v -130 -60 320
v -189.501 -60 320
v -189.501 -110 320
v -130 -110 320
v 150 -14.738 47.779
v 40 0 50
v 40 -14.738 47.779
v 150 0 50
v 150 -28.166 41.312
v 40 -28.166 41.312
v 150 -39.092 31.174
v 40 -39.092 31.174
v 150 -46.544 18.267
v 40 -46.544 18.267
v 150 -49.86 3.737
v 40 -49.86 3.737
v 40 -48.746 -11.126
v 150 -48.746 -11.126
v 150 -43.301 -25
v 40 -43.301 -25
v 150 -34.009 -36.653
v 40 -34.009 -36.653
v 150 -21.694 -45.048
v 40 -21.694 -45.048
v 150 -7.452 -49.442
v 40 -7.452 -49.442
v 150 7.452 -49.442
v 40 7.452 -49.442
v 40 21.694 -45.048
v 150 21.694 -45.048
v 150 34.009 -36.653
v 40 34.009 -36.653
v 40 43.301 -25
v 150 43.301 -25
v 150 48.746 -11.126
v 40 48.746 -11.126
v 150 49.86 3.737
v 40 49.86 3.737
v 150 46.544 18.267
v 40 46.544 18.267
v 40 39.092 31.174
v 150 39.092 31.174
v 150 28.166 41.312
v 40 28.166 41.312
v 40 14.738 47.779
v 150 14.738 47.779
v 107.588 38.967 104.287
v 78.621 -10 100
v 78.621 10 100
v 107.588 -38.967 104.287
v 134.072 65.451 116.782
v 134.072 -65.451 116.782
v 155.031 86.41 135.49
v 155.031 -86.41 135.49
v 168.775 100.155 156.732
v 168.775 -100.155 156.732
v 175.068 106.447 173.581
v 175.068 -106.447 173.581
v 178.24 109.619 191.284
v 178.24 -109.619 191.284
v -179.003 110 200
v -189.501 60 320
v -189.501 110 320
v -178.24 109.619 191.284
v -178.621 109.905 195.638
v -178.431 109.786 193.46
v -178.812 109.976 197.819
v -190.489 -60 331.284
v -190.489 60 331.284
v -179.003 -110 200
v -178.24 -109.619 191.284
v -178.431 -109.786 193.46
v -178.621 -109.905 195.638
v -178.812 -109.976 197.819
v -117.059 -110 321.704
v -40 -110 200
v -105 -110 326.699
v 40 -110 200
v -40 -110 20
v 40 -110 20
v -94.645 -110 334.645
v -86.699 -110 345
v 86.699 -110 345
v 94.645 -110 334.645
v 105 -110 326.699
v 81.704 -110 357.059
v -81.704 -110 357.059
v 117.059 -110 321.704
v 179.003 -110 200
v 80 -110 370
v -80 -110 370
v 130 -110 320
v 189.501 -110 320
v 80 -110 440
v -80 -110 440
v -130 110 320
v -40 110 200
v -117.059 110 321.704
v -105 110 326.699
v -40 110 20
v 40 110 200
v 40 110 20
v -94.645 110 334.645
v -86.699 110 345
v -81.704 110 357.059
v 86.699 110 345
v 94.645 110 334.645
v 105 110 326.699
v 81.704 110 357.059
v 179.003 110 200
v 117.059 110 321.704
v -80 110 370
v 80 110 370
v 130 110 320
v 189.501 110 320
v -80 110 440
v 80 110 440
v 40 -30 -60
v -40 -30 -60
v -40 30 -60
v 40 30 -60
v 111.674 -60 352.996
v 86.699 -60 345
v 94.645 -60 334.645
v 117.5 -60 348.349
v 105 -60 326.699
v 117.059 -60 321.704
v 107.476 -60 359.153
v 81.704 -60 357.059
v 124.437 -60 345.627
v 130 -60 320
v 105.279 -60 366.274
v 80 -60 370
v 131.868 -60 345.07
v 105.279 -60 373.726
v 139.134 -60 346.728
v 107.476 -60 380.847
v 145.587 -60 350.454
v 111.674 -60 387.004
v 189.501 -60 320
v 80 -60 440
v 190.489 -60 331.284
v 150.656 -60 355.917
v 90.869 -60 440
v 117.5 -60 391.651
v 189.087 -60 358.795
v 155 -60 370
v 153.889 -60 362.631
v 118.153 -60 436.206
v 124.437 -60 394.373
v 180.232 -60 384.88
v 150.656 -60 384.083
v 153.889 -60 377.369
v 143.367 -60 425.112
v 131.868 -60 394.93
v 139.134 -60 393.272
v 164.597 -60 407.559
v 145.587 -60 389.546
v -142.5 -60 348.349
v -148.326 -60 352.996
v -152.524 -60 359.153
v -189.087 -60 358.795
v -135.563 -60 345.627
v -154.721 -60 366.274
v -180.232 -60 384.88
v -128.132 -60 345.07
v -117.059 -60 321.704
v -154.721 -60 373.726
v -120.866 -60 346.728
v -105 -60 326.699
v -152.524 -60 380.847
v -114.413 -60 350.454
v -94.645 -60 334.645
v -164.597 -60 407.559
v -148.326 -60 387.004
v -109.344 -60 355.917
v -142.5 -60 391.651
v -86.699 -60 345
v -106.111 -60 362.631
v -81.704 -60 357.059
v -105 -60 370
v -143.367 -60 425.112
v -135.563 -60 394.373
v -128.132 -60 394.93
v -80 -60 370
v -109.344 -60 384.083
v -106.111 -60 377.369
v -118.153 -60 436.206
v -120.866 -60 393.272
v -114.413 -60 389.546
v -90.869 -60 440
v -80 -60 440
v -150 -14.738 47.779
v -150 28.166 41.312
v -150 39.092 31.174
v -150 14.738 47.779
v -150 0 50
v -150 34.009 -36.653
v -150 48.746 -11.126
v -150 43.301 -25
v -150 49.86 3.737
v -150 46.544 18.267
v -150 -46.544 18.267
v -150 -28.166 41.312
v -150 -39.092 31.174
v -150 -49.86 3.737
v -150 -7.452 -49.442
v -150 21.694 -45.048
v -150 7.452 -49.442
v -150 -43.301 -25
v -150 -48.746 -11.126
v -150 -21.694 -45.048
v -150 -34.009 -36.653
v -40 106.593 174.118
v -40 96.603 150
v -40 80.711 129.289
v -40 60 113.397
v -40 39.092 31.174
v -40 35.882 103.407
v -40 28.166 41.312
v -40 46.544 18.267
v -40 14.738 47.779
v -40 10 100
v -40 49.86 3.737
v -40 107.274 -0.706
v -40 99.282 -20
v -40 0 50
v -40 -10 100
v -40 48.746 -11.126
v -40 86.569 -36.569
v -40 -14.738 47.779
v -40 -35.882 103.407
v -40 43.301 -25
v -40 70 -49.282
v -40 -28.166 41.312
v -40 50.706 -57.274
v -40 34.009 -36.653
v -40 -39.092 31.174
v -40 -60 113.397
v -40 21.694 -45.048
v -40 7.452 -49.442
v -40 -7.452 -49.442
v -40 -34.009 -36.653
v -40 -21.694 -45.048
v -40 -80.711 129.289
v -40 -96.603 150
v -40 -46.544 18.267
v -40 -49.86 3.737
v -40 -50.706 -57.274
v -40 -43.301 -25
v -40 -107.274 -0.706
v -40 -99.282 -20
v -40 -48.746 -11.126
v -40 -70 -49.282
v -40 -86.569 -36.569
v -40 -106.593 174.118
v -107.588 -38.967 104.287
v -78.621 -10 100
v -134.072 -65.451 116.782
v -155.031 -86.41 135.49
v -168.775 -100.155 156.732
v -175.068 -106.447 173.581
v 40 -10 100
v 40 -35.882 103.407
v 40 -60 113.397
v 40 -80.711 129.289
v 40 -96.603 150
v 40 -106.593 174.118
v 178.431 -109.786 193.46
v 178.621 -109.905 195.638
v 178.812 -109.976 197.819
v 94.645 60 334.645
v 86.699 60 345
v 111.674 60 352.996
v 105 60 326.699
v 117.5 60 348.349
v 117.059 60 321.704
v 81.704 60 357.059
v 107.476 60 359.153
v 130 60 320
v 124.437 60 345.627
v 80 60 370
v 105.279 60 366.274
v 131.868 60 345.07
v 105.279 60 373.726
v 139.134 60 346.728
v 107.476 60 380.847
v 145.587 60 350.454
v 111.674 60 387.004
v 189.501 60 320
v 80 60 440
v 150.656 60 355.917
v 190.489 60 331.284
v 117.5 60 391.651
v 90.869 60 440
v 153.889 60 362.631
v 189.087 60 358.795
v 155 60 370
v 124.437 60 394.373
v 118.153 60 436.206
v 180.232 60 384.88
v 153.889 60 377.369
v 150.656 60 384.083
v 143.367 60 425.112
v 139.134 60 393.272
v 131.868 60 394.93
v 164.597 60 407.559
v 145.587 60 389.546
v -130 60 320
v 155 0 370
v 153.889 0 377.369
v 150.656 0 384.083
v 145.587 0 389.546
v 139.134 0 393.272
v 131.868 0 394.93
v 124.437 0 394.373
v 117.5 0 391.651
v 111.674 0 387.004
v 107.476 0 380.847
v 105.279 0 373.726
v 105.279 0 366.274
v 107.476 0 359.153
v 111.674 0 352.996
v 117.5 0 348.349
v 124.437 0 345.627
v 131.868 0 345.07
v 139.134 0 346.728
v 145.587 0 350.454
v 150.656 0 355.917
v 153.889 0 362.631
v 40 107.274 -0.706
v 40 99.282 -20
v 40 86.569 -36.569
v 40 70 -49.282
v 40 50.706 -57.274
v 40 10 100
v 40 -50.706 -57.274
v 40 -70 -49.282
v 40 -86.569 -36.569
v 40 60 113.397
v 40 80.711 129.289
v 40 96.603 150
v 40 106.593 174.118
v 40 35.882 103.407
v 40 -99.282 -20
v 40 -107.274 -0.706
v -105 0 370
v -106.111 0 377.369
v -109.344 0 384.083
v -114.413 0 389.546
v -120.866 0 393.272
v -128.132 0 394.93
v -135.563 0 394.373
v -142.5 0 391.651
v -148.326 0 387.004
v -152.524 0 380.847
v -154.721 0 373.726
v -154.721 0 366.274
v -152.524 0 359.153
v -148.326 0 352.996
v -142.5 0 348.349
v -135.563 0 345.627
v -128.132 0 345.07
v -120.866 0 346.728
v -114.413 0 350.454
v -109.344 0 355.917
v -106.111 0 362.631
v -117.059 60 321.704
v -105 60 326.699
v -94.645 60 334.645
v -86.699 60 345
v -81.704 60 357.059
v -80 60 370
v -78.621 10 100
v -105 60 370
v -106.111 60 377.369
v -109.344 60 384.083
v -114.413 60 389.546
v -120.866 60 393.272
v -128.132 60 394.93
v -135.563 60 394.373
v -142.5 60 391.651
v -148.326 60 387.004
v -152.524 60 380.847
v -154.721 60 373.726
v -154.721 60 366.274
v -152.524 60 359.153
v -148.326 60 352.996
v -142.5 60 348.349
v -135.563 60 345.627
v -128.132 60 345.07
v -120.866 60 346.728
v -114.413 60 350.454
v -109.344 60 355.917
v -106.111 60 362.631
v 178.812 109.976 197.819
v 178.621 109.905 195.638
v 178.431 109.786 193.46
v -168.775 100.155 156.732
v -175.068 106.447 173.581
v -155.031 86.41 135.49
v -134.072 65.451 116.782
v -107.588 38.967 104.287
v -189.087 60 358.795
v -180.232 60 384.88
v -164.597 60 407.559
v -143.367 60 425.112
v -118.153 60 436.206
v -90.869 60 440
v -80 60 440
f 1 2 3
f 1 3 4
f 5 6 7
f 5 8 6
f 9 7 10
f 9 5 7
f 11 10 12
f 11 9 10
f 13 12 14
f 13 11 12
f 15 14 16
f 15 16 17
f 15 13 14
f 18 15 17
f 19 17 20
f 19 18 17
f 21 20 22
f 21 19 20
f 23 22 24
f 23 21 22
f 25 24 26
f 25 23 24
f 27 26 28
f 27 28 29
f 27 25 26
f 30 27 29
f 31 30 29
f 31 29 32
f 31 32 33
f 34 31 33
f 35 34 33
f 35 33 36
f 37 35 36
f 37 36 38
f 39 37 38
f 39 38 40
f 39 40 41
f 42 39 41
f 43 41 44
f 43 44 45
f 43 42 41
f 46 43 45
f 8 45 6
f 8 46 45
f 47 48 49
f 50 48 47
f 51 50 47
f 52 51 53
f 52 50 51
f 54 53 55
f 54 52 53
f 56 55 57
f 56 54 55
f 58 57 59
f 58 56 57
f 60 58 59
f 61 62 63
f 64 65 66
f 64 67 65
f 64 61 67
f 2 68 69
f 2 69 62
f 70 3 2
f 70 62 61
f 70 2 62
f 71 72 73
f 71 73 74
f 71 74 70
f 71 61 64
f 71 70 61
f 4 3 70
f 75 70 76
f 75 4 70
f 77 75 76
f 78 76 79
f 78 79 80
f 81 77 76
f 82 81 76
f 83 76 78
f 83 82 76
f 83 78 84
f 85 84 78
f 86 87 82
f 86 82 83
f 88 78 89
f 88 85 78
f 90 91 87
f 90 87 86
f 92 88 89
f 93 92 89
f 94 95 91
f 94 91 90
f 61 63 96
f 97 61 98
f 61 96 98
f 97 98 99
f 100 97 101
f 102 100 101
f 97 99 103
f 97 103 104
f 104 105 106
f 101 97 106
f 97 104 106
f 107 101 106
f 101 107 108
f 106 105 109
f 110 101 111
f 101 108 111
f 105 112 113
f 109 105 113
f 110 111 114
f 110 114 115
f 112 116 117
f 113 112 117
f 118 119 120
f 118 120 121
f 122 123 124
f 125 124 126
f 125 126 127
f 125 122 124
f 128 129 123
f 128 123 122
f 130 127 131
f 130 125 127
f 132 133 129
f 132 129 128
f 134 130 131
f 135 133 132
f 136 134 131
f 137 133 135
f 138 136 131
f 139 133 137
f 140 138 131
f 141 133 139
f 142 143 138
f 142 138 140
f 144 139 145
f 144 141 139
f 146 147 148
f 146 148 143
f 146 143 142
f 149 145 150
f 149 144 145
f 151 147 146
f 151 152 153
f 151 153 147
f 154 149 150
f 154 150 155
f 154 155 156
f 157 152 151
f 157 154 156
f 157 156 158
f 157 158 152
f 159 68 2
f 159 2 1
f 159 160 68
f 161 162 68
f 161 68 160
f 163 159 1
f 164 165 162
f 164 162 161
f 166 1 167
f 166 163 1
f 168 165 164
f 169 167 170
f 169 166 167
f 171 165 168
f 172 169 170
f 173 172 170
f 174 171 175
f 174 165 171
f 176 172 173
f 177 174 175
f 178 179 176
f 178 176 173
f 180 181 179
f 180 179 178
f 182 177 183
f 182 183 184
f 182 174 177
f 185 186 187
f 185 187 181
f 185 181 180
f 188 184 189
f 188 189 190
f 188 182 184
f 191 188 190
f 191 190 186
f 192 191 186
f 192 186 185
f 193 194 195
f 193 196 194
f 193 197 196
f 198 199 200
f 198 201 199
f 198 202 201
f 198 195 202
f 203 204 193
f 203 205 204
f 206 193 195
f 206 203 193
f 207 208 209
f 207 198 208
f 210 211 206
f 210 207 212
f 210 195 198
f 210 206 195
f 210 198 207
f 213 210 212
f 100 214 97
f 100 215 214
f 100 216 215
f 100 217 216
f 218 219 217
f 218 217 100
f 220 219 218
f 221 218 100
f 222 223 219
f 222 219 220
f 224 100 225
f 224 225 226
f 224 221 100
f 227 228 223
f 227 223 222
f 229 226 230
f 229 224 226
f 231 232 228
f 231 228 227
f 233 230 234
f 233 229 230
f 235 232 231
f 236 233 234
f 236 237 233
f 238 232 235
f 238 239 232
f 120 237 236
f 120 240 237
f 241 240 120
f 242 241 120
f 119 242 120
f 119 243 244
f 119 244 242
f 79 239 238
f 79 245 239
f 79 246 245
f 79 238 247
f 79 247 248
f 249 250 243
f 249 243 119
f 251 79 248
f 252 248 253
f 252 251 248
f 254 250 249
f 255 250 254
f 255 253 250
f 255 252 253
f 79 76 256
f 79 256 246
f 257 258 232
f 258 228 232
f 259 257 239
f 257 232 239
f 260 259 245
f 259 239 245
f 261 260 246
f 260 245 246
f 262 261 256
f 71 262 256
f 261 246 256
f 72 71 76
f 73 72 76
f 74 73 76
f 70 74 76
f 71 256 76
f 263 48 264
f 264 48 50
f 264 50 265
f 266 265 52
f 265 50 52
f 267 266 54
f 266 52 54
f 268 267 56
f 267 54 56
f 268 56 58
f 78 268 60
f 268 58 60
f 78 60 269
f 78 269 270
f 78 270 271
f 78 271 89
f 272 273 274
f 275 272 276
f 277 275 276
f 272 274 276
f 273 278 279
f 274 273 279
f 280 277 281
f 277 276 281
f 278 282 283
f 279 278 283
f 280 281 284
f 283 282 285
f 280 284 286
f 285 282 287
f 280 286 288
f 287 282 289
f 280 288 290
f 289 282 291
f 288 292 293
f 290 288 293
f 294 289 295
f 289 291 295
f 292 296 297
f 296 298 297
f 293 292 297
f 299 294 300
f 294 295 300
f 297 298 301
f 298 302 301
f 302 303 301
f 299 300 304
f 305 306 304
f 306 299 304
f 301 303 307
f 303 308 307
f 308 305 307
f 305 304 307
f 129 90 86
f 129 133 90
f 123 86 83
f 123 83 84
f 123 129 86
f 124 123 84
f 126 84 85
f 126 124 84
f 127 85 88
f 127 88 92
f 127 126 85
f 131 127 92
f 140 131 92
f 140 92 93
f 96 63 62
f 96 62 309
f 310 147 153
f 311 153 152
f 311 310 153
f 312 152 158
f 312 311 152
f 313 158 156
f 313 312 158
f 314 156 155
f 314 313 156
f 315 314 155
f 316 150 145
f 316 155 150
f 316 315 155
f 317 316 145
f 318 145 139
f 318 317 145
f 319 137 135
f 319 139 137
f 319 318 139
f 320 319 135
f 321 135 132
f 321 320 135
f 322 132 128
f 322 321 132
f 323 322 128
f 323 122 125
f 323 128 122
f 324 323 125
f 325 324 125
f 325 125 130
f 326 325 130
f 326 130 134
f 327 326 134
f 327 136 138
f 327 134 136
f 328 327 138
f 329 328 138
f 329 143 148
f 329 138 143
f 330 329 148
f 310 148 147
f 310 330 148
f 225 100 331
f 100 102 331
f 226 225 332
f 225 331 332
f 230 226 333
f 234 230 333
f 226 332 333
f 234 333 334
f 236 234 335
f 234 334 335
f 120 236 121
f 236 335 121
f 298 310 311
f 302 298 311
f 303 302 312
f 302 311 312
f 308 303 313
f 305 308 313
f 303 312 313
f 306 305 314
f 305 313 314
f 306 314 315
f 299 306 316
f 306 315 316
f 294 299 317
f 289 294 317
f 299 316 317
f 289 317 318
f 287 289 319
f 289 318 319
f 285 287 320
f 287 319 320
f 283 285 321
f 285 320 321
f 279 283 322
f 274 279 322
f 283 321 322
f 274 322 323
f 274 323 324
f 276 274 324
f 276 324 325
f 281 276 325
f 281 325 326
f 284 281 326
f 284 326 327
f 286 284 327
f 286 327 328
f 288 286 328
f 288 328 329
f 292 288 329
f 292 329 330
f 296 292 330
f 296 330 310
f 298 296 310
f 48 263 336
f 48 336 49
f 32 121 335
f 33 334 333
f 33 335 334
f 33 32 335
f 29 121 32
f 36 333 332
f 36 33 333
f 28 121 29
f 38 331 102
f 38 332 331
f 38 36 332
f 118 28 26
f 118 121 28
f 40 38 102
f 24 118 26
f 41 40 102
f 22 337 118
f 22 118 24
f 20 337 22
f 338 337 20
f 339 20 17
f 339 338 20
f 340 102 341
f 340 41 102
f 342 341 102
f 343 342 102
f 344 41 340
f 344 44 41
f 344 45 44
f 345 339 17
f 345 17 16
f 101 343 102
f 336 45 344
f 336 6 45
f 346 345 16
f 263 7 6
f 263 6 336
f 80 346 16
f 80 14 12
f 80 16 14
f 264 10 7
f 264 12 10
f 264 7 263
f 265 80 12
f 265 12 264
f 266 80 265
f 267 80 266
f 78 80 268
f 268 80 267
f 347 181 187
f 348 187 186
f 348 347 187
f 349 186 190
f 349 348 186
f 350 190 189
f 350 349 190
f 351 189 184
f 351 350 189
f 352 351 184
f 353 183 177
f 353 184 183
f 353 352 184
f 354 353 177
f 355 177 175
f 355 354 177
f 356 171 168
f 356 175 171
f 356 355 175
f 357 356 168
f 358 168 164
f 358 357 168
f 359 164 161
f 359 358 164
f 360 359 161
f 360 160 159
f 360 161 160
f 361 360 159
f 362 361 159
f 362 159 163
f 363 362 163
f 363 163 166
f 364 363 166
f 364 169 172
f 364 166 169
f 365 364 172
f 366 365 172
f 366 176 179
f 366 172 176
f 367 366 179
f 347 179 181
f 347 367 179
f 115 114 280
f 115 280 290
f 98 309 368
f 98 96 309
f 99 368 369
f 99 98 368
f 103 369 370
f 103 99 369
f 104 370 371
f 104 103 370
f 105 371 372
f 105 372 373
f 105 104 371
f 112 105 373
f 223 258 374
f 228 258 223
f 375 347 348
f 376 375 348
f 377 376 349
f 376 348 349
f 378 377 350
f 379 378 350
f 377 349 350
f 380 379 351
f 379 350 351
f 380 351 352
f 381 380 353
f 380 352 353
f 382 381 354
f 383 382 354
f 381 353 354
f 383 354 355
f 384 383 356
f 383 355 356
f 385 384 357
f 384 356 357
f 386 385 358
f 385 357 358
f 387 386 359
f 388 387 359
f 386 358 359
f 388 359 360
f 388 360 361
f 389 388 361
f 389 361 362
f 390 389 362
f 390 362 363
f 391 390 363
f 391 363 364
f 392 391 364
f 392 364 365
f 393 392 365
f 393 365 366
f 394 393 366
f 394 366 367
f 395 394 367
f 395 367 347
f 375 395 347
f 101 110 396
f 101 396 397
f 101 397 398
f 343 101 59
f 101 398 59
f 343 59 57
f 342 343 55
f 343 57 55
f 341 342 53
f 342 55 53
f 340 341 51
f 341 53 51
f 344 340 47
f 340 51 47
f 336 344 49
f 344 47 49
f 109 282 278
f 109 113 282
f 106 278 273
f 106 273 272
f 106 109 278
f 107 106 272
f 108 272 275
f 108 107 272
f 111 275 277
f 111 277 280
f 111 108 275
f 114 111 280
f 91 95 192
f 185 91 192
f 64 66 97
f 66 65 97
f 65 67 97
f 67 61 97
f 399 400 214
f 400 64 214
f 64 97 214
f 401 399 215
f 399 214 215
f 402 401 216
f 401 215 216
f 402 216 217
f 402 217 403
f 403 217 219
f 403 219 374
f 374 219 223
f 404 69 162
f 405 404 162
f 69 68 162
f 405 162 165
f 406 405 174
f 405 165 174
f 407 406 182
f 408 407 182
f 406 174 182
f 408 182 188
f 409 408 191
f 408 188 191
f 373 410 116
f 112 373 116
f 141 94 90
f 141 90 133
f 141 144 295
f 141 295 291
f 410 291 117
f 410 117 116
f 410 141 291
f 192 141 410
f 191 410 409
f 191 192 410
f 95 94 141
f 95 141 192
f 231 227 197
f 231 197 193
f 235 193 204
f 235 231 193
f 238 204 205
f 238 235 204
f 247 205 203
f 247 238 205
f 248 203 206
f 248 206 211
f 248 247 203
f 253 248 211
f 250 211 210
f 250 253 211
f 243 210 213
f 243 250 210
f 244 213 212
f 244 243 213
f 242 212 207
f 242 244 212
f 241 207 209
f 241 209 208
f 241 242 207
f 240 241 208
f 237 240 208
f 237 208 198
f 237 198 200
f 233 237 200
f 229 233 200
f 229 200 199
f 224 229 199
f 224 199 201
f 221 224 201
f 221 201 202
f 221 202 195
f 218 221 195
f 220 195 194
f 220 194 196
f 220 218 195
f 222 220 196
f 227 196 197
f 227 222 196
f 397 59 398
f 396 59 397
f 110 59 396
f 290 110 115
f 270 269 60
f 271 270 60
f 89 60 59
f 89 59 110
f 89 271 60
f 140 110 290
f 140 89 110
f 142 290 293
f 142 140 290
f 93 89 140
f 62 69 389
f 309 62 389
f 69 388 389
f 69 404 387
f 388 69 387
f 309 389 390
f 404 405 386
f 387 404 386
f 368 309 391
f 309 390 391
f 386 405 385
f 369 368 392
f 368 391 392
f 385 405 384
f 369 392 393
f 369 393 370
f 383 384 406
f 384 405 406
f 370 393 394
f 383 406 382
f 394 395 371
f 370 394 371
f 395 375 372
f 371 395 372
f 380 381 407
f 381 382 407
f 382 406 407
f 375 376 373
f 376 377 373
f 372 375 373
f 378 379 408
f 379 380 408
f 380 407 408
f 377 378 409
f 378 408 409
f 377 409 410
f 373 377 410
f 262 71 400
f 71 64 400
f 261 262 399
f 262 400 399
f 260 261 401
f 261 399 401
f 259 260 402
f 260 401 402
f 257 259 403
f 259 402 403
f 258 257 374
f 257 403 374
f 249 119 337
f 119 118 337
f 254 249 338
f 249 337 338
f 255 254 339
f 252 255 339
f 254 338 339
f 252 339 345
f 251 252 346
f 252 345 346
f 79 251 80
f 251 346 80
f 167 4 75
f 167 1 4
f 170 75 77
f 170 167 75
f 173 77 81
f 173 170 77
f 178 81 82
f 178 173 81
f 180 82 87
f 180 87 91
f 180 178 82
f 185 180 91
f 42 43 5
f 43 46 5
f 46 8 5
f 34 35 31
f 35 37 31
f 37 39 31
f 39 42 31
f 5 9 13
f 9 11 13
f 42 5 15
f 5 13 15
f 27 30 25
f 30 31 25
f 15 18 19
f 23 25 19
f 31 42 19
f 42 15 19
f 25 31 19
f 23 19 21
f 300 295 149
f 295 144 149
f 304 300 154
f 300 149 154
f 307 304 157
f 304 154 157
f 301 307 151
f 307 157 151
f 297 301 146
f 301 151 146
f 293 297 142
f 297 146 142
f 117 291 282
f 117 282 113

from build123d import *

# Parameters (mm, degrees)
F1_DEPTH      = 110
F2_W          = 300
F2_H          = 50
F4_W          = 120
F4_H          = 50
F5_DEPTH      = 120
F6_R          = 50
F7_R          = 100
F8_R          = 25
F9_DEPTH      = 110.001
F9_DEPTH_BACK = 110.001
F10_R         = 80


with BuildPart() as f1:
    # F0 (on Front) → F1 (new body, symmetric)
    with BuildSketch(Plane.XZ):
        Polygon((-40, -60), (0, -60), (40, -60), (40, 100), (170.2538544012, 100), (200, 440), (0, 440), (-200, 440), (-170.2538544012, 100), (-40, 100), align=None)
    extrude(amount=F1_DEPTH, both=True)

    # F2 (on Front) → F3 (revolve)
    with BuildSketch(Plane.XZ):
        with Locations((0, 25)):
            Rectangle(F2_W, F2_H)
    revolve(axis=Axis((165.973843012, 0, 0), (1, 0, 0)))

    # F4 (on face) → F5 (cut)
    with BuildSketch(Plane.XY.offset(440)):
        with Locations((140, -85)):
            Rectangle(F4_W, F4_H)
        with Locations((140, 85)):
            Rectangle(F4_W, F4_H)
        with Locations((-140, 85)):
            Rectangle(F4_W, F4_H)
        with Locations((-140, -85)):
            Rectangle(F4_W, F4_H)
    extrude(amount=-F5_DEPTH, mode=Mode.SUBTRACT)

    # F6
    f6_edges = [f1.edges().sort_by_distance(p)[0] for p in [
        (80, -85, 320),
        (-80, -85, 320),
        (-80, 85, 320),
        (80, 85, 320),
    ]]
    fillet(f6_edges, radius=F6_R)

    # F7
    f7_edges = [f1.edges().sort_by_distance(p)[0] for p in [
        (200, 0, 440),
        (-200, 0, 440),
        (105.126927, -110, 100),
        (170.253854, 0, 100),
        (105.126927, 110, 100),
        (-105.126927, 110, 100),
        (-105.126927, -110, 100),
        (-170.253854, 0, 100),
    ]]
    fillet(f7_edges, radius=F7_R)

    # F8 (on Front) → F9 (cut, two sides)
    with BuildSketch(Plane.XZ) as f9_sk:
        with Locations((130, 370)):
            Circle(F8_R)
        with Locations((-130, 370)):
            Circle(F8_R)
    extrude(amount=-F9_DEPTH, mode=Mode.SUBTRACT)
    extrude(f9_sk.sketch, amount=F9_DEPTH_BACK, mode=Mode.SUBTRACT)

    # F10
    f10_edges = [f1.edges().sort_by_distance(p)[0] for p in [
        (0, -110, -60),
        (0, 110, -60),
    ]]
    fillet(f10_edges, radius=F10_R)


solid = f1.part
